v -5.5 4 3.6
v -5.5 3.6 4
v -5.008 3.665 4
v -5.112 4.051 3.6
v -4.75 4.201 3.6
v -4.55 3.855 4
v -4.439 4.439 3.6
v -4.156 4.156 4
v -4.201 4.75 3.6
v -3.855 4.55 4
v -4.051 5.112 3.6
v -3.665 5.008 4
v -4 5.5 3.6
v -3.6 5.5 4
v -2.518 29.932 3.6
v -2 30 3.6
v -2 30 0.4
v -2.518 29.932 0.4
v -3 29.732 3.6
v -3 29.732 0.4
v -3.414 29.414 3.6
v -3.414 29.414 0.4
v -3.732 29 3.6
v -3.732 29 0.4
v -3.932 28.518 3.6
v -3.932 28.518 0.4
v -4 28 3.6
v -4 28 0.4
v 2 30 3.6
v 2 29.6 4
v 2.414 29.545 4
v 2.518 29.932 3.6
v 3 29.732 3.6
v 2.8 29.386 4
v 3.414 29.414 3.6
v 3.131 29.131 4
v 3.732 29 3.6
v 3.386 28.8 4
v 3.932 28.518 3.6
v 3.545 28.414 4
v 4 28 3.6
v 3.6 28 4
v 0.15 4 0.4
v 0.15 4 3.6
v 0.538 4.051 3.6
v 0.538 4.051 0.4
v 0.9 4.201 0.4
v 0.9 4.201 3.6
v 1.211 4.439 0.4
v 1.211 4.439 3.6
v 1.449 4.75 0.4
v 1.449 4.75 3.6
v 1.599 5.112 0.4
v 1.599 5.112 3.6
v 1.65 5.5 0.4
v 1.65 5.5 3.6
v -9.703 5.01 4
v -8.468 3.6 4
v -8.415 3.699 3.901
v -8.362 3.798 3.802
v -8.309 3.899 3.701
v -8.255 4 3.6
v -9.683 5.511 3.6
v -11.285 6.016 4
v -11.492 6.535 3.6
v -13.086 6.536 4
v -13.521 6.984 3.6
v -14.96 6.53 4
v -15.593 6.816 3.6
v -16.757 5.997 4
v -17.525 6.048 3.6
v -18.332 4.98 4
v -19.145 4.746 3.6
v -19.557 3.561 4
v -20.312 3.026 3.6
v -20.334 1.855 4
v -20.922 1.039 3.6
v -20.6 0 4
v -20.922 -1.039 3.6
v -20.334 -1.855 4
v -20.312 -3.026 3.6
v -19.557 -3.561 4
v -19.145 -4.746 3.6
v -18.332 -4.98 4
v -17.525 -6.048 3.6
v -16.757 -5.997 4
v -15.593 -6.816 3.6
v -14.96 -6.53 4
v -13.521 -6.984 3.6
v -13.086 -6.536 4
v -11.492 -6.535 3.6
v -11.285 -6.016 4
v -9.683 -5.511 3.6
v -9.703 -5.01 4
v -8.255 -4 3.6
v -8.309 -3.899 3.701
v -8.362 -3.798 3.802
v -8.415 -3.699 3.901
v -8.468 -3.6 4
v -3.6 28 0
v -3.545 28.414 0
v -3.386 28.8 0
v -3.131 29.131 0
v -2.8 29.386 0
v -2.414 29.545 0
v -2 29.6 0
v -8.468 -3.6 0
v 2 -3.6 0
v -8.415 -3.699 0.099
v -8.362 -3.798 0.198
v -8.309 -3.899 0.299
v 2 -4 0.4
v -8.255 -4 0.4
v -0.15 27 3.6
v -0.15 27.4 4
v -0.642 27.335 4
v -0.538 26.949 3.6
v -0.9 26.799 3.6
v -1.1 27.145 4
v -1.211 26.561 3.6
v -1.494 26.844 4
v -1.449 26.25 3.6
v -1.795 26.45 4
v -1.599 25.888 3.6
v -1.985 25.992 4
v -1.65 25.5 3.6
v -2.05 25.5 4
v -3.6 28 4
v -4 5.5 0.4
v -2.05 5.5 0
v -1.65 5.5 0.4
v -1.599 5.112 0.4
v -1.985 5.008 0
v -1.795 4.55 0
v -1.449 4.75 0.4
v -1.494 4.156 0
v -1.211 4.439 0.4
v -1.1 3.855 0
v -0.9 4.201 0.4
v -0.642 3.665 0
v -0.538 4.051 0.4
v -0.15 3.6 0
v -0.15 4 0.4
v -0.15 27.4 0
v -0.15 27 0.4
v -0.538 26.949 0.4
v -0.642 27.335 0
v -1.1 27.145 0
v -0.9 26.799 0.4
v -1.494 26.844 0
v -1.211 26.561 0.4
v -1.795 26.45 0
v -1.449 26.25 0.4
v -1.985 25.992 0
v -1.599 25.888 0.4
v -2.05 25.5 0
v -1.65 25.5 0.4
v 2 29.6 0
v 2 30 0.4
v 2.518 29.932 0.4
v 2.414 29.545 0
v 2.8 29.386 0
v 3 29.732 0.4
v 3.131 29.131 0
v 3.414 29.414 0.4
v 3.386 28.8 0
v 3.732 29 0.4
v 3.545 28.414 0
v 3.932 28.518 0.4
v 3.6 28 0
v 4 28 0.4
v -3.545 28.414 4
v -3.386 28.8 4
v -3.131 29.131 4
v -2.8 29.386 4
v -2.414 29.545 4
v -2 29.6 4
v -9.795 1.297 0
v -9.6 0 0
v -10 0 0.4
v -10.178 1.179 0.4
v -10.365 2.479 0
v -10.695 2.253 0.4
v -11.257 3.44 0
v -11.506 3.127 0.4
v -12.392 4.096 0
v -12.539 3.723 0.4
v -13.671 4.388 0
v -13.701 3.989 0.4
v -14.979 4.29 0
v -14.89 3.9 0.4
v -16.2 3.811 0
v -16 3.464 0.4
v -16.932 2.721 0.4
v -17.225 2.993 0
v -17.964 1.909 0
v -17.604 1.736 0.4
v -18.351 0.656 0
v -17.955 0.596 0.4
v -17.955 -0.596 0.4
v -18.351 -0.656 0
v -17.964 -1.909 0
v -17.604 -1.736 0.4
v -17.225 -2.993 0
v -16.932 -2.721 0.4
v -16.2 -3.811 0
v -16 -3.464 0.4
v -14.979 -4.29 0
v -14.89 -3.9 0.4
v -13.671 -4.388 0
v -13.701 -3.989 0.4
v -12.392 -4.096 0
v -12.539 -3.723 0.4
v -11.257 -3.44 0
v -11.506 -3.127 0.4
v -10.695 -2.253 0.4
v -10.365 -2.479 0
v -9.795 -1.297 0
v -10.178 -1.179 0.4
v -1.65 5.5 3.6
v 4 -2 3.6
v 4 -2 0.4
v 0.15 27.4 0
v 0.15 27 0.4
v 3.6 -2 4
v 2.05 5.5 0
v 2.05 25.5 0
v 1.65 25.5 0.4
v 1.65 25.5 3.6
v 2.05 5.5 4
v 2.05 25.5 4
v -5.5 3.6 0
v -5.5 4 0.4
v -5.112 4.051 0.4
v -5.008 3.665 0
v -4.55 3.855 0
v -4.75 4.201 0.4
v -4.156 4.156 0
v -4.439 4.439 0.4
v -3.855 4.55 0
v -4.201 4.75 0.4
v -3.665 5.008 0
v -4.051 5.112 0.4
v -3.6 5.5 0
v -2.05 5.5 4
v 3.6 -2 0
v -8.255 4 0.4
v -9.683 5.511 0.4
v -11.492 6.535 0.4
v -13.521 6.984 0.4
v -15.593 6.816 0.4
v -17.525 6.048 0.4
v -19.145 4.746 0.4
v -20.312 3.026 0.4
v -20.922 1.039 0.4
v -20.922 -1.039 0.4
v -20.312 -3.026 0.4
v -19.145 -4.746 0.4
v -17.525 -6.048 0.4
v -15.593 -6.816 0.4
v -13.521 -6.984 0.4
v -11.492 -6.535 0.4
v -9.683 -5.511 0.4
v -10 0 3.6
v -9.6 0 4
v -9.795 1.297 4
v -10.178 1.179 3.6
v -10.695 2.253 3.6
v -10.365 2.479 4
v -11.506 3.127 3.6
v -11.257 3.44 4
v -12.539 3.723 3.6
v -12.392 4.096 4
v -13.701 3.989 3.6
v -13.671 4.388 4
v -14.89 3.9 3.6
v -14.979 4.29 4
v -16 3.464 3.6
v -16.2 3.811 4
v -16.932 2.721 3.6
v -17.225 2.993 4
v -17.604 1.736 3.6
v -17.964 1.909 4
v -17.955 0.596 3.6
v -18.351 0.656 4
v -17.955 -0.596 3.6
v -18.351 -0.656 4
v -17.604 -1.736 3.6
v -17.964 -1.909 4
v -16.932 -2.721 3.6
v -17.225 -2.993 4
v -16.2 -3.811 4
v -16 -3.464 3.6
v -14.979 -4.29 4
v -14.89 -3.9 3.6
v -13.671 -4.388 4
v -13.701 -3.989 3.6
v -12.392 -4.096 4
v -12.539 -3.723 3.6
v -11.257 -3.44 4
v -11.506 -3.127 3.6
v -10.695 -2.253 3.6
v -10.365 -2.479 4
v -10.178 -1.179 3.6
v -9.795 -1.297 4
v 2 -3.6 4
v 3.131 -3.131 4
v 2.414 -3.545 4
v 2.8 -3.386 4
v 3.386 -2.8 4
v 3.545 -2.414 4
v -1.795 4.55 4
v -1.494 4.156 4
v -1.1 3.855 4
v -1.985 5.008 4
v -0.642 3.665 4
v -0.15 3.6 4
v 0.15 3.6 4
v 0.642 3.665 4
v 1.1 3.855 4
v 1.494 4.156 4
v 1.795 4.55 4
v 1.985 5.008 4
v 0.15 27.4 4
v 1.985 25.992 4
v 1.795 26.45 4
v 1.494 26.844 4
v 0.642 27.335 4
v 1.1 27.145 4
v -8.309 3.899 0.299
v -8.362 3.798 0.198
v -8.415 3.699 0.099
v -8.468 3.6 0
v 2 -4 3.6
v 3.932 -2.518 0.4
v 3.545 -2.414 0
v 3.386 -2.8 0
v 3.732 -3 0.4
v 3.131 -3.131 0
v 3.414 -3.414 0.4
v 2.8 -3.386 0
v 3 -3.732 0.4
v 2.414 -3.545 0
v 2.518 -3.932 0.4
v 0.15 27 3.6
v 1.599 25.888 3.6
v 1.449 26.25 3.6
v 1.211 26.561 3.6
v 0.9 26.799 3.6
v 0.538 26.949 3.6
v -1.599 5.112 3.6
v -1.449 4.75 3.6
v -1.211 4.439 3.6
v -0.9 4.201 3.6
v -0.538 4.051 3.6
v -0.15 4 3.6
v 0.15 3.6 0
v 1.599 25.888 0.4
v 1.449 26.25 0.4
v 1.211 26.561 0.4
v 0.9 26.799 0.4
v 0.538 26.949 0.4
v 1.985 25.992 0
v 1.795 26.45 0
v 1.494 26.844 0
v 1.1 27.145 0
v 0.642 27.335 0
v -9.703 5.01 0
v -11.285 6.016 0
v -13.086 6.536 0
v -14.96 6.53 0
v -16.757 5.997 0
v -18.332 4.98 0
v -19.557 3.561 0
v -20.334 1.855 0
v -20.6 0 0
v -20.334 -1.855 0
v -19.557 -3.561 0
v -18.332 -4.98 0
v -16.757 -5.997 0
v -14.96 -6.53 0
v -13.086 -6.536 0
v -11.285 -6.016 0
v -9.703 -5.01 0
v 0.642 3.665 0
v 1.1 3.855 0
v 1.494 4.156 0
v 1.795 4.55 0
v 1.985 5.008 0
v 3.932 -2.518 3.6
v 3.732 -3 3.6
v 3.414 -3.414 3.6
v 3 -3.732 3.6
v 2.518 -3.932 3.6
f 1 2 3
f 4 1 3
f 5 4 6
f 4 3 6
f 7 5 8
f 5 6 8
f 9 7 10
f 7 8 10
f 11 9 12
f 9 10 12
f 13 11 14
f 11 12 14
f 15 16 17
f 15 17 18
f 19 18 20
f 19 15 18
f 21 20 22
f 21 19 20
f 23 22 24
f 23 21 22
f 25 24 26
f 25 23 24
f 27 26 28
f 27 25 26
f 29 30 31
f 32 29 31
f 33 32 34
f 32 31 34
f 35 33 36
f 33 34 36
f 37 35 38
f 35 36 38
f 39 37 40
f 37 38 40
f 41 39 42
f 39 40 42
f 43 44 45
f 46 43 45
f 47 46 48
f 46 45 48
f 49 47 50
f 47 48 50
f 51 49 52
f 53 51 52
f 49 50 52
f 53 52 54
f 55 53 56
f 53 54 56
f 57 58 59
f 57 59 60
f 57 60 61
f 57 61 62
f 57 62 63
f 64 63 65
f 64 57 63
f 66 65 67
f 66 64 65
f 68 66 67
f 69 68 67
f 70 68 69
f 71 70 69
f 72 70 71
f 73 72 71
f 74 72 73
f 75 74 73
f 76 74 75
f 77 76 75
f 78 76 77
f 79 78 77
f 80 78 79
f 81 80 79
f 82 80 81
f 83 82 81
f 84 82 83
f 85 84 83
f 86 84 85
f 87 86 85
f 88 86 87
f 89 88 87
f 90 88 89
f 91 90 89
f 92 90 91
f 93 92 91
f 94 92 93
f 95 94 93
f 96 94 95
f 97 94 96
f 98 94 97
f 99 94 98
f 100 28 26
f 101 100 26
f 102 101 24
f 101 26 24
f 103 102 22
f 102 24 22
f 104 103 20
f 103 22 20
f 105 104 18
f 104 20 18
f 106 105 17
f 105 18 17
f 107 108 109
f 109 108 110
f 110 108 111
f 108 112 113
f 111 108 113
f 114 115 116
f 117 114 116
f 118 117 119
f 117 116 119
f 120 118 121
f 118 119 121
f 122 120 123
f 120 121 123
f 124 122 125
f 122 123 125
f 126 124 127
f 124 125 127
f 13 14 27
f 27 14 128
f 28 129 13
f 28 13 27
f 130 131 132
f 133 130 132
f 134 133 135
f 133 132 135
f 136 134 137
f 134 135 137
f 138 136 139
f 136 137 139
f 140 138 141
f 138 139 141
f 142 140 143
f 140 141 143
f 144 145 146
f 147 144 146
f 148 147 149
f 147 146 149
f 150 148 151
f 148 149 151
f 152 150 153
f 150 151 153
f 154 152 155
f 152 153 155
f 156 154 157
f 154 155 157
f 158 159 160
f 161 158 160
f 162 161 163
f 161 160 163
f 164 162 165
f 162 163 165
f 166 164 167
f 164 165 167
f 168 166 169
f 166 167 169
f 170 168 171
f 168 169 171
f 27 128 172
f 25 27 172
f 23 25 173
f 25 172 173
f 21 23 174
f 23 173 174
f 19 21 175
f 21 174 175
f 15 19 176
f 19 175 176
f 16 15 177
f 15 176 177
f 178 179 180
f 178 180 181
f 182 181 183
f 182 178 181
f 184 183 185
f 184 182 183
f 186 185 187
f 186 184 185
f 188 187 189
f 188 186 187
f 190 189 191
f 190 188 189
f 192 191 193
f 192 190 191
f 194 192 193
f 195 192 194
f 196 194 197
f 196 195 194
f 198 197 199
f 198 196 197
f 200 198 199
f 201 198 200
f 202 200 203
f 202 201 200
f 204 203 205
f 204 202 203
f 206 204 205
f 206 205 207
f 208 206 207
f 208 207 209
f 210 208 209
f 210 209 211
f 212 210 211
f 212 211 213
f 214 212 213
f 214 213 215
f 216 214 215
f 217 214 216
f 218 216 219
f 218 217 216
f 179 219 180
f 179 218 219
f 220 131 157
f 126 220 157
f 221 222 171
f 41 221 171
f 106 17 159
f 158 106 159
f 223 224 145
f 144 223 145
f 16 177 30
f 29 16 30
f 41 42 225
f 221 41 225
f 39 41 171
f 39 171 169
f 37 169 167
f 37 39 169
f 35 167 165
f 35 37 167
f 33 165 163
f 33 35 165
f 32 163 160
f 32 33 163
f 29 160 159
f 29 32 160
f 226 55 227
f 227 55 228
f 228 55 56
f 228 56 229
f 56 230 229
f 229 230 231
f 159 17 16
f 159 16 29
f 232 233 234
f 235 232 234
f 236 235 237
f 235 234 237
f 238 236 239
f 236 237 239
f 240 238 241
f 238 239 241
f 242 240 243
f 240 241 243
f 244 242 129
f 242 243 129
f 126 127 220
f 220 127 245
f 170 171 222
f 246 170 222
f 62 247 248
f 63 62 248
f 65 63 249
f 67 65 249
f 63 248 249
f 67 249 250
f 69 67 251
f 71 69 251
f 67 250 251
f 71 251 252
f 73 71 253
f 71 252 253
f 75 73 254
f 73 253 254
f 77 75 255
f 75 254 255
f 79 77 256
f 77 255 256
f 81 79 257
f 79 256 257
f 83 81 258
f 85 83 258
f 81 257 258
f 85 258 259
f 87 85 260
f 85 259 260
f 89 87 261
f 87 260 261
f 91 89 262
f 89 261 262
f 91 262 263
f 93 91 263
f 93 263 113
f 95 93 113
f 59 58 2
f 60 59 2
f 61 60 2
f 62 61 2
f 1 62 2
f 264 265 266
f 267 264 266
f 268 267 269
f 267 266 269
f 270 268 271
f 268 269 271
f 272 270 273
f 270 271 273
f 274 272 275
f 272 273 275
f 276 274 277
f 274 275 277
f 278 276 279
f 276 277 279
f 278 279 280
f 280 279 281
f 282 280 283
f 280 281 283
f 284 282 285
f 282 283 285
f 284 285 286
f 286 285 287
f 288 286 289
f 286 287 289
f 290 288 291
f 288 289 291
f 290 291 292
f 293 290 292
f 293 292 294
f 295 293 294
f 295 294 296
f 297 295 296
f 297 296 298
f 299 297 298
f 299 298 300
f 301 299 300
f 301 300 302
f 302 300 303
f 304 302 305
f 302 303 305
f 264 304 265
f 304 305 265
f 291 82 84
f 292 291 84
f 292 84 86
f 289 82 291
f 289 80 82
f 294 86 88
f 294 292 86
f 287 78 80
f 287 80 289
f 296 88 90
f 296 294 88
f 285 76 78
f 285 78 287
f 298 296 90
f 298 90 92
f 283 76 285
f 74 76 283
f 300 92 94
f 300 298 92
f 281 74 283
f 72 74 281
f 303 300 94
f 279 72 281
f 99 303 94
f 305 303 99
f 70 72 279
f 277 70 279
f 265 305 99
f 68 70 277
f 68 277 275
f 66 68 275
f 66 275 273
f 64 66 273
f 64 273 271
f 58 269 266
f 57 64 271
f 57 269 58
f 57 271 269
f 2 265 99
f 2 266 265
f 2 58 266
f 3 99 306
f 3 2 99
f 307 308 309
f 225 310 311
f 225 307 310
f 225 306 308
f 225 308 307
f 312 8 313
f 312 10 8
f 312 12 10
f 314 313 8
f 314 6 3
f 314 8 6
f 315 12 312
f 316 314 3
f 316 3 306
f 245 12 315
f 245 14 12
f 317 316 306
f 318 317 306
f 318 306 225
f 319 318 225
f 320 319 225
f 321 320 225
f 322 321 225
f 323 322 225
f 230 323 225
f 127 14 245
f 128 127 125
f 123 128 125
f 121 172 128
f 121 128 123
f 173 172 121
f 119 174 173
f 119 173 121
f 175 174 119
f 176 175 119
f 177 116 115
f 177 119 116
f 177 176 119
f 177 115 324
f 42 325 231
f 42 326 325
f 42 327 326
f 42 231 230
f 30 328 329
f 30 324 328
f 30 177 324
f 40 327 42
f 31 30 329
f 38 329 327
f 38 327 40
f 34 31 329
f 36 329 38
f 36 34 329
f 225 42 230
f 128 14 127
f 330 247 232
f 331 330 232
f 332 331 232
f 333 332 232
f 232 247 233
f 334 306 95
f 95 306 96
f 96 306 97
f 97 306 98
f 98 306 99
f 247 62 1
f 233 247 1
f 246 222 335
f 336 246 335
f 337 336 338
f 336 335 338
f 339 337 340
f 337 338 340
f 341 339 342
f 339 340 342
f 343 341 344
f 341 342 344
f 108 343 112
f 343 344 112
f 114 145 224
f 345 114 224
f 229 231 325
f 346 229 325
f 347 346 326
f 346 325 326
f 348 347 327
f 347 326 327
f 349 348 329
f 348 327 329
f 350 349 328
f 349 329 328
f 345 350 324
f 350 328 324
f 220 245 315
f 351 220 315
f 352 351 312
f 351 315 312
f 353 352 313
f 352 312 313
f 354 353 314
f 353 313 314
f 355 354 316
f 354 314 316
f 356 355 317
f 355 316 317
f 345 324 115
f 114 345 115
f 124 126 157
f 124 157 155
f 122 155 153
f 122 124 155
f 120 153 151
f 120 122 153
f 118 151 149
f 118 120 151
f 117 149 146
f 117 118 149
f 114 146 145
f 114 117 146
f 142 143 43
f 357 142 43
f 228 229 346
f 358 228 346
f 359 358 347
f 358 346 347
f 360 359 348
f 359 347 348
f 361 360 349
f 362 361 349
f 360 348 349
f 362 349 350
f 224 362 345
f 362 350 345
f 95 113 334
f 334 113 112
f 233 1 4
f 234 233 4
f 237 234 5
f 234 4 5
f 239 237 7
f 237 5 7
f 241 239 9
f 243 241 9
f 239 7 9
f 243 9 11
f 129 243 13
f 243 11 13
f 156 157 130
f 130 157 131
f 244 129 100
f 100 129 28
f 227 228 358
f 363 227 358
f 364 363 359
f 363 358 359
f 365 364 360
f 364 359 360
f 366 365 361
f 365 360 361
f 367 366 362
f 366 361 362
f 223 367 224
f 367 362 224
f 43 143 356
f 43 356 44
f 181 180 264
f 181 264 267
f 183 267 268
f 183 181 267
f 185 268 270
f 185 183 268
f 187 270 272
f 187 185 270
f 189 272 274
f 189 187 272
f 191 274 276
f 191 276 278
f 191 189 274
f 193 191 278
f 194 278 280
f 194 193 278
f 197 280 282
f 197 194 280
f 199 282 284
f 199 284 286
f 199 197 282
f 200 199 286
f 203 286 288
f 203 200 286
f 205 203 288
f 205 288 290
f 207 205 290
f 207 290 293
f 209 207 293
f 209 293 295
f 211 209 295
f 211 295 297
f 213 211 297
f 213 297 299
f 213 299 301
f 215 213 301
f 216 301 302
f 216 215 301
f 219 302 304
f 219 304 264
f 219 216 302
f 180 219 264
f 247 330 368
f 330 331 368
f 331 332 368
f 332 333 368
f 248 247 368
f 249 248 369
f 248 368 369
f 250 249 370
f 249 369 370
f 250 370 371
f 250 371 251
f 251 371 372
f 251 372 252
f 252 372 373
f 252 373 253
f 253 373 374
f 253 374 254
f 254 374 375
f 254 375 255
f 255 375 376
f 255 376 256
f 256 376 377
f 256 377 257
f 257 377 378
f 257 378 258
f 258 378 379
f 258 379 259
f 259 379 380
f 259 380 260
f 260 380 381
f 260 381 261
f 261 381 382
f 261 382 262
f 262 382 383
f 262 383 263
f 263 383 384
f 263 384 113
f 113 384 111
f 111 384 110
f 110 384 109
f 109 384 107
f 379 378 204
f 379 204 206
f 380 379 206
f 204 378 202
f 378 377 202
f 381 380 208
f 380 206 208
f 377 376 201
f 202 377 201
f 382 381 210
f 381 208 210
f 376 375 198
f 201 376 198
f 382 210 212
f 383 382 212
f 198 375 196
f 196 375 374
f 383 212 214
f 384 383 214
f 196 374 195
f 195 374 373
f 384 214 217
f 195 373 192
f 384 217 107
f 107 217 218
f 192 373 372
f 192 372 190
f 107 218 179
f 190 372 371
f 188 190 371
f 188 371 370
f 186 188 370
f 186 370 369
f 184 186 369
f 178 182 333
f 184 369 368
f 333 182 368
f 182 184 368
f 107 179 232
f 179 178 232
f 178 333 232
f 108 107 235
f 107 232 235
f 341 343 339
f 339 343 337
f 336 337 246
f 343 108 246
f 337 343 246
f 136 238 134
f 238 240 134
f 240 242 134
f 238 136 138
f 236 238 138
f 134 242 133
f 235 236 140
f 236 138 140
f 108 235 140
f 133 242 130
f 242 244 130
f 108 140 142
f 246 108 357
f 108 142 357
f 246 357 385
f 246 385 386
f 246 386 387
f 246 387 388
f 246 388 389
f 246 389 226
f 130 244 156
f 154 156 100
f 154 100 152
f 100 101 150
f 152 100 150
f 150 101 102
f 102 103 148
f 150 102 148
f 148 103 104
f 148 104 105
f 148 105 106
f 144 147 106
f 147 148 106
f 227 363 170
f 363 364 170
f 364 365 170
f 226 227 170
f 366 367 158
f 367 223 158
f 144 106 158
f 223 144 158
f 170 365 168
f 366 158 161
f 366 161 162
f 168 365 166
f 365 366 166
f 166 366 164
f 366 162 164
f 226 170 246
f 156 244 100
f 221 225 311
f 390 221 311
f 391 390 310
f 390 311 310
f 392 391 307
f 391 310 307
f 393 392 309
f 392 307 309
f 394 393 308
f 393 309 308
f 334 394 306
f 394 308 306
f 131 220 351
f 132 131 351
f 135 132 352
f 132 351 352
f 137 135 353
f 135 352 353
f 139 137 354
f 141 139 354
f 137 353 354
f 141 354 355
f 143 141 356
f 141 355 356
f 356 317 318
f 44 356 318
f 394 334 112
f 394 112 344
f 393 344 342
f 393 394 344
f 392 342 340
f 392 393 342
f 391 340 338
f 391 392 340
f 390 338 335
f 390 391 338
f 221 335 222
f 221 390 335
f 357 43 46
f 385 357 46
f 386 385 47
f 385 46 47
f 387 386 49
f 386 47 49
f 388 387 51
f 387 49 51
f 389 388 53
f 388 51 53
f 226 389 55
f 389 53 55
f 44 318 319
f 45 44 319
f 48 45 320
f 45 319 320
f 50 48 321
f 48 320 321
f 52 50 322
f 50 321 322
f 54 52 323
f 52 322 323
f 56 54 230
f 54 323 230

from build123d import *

# Parameters (mm, degrees)
BOX001001004_W     = 3.3
BOX001001004_H     = 23
BOX001001004_DEPTH = 10
FILLET003_R        = 1.5
BOX001001005_W     = 8
BOX001001005_H     = 34
BOX001001005_DEPTH = 4
BOX001001006_W     = 8
BOX001001006_H     = 8
BOX001001006_DEPTH = 4
FILLET_R           = 2
FILLET004_R        = 1.5
CHAMFER005_SIZE    = 0.4
TUBE001_R          = 7
TUBE001_R_2        = 4
TUBE001_DEPTH      = 4
CHAMFER004_SIZE    = 0.4


with BuildPart() as fillet003:
    # Box001001004 → Box001001004 (new body)
    with BuildSketch(Plane(origin=(-1.65, 4, 0), x_dir=(1, 0, 0), z_dir=(0, 0, 1))):
        with Locations((1.65, 11.5)):
            Rectangle(BOX001001004_W, BOX001001004_H)
    extrude(amount=BOX001001004_DEPTH)

    # Fillet003
    fillet003_edges = [fillet003.edges().sort_by_distance(p)[0] for p in [
        (-1.65, 4, 5),
        (-1.65, 27, 5),
        (1.65, 4, 5),
        (1.65, 27, 5),
    ]]
    fillet(fillet003_edges, radius=FILLET003_R)


with BuildPart() as cube007:
    # Box001001005 → Box001001005 (new body)
    with BuildSketch(Plane(origin=(-4, -4, 0), x_dir=(1, 0, 0), z_dir=(0, 0, 1))):
        with Locations((4, 17)):
            Rectangle(BOX001001005_W, BOX001001005_H)
    extrude(amount=BOX001001005_DEPTH)


with BuildPart() as chamfer005:
    # Box001001006 → Box001001006 (new body)
    with BuildSketch(Plane(origin=(-9, -4, 0), x_dir=(1, 0, 0), z_dir=(0, 0, 1))):
        with Locations((4, 4)):
            Rectangle(BOX001001006_W, BOX001001006_H)
    extrude(amount=BOX001001006_DEPTH)

    # Fusion002: union Cube007
    add(cube007.part)

    # Fillet
    fillet_edges = [chamfer005.edges().sort_by_distance(p)[0] for p in [
        (-4, 30, 2),
        (4, -4, 2),
        (4, 30, 2),
    ]]
    fillet(fillet_edges, radius=FILLET_R)

    # Fillet004
    fillet004_edges = [chamfer005.edges().sort_by_distance(p)[0] for p in [
        (-4, 4, 2),
    ]]
    fillet(fillet004_edges, radius=FILLET004_R)

    # Cut002008023012009006003002007005: cut Fillet003
    add(fillet003.part, mode=Mode.SUBTRACT)

    # Chamfer005
    chamfer005_edges = [chamfer005.edges().sort_by_distance(p)[0] for p in [
        (-4, 16.75, 4),
        (-4, 16.75, 0),
        (-4.43934, 4.43934, 4),
        (-4.43934, 4.43934, 0),
        (-3.414214, 29.414214, 0),
        (-3.414214, 29.414214, 4),
        (0, 30, 0),
        (0, 30, 4),
        (3.414214, 29.414214, 0),
        (3.414214, 29.414214, 4),
        (4, 13, 4),
        (4, 13, 0),
        (3.414214, -3.414214, 0),
        (3.414214, -3.414214, 4),
        (-7.25, 4, 0),
        (-7.25, 4, 4),
        (-9, 0, 4),
        (-9, 0, 0),
        (-3.5, -4, 4),
        (-1.21066, 4.43934, 4),
        (-1.65, 15.5, 4),
        (-1.21066, 26.56066, 4),
        (0, 27, 4),
        (1.21066, 26.56066, 4),
        (1.65, 15.5, 4),
        (1.21066, 4.43934, 4),
        (0, 4, 4),
        (-1.21066, 4.43934, 0),
        (0, 4, 0),
        (1.21066, 4.43934, 0),
        (1.65, 15.5, 0),
        (1.21066, 26.56066, 0),
        (0, 27, 0),
        (-1.21066, 26.56066, 0),
        (-1.65, 15.5, 0),
        (-3.5, -4, 0),
    ]]
    chamfer(chamfer005_edges, length=CHAMFER005_SIZE)


with BuildPart() as fusion003001:
    # Tube001 → Tube001 (new body)
    with BuildSketch(Plane.XY):
        Circle(TUBE001_R)
        Circle(TUBE001_R_2, mode=Mode.SUBTRACT)
    extrude(amount=TUBE001_DEPTH)

    # Chamfer004
    chamfer004_edges = [fusion003001.edges().sort_by_distance(p)[0] for p in [
        (-7, 0, 4),
        (-7, 0, 0),
        (-4, 0, 4),
        (-4, 0, 0),
    ]]
    chamfer(chamfer004_edges, length=CHAMFER004_SIZE)


with BuildPart() as fusion003001_1:
    # Chamfer004 placement: moved
    add(fusion003001.part.moved(Location((-14, 0, 0))))

    # Fusion003: union Chamfer005
    add(chamfer005.part)


solid = fusion003001_1.part
